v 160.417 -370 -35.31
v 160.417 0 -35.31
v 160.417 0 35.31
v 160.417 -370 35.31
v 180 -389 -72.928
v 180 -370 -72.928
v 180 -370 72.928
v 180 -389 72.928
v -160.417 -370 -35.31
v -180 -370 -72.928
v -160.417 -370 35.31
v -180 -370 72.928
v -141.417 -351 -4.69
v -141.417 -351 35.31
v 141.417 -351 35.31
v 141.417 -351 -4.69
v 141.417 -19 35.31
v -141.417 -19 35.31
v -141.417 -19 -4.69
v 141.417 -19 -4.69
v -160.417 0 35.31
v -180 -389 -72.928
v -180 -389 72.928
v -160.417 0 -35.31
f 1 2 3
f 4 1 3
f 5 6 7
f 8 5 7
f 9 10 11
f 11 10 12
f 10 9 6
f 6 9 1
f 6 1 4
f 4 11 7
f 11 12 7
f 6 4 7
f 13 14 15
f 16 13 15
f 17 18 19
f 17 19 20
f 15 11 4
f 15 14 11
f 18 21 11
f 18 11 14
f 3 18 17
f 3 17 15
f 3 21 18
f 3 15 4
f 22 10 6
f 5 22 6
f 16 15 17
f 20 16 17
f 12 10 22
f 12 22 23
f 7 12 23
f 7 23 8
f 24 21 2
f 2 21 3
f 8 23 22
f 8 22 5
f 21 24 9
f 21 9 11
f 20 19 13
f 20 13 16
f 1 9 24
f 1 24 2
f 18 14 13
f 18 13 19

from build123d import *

# Parameters (mm, degrees)
F0_W     = 320.8331465721
F0_H     = 70.6209391356
F1_DEPTH = 370
F2_W     = 282.8331465721
F2_H     = 332
F3_DEPTH = 40
F4_W     = 282.8331465721
F4_H     = 332
F5_DEPTH = 40
F6_W     = 360
F6_H     = 145.8556303974
F6_W_2   = 320.8331465721
F6_H_2   = 70.6209391356
F7_DEPTH = 19


with BuildPart() as f1:
    # F0 (on Front) → F1 (new body)
    with BuildSketch(Plane.XZ):
        Rectangle(F0_W, F0_H)
    extrude(amount=F1_DEPTH)

    # F2 (on face) → F3 (join)
    with BuildSketch(Plane.XY.offset(35.3104695678)):
        with Locations((0, -185)):
            Rectangle(F2_W, F2_H)
    extrude(amount=-F3_DEPTH)

    # F4 (on face) → F5 (cut)
    with BuildSketch(Plane.XY.offset(35.3104695678)):
        with Locations((0, -185)):
            Rectangle(F4_W, F4_H)
    extrude(amount=-F5_DEPTH, mode=Mode.SUBTRACT)

    # F6 (on face) → F7 (join)
    with BuildSketch(Plane.XZ.offset(370)):
        Rectangle(F6_W, F6_H)
        Rectangle(F6_W_2, F6_H_2, mode=Mode.SUBTRACT)
        Rectangle(F6_W_2, F6_H_2)
    extrude(amount=F7_DEPTH)


solid = f1.part
